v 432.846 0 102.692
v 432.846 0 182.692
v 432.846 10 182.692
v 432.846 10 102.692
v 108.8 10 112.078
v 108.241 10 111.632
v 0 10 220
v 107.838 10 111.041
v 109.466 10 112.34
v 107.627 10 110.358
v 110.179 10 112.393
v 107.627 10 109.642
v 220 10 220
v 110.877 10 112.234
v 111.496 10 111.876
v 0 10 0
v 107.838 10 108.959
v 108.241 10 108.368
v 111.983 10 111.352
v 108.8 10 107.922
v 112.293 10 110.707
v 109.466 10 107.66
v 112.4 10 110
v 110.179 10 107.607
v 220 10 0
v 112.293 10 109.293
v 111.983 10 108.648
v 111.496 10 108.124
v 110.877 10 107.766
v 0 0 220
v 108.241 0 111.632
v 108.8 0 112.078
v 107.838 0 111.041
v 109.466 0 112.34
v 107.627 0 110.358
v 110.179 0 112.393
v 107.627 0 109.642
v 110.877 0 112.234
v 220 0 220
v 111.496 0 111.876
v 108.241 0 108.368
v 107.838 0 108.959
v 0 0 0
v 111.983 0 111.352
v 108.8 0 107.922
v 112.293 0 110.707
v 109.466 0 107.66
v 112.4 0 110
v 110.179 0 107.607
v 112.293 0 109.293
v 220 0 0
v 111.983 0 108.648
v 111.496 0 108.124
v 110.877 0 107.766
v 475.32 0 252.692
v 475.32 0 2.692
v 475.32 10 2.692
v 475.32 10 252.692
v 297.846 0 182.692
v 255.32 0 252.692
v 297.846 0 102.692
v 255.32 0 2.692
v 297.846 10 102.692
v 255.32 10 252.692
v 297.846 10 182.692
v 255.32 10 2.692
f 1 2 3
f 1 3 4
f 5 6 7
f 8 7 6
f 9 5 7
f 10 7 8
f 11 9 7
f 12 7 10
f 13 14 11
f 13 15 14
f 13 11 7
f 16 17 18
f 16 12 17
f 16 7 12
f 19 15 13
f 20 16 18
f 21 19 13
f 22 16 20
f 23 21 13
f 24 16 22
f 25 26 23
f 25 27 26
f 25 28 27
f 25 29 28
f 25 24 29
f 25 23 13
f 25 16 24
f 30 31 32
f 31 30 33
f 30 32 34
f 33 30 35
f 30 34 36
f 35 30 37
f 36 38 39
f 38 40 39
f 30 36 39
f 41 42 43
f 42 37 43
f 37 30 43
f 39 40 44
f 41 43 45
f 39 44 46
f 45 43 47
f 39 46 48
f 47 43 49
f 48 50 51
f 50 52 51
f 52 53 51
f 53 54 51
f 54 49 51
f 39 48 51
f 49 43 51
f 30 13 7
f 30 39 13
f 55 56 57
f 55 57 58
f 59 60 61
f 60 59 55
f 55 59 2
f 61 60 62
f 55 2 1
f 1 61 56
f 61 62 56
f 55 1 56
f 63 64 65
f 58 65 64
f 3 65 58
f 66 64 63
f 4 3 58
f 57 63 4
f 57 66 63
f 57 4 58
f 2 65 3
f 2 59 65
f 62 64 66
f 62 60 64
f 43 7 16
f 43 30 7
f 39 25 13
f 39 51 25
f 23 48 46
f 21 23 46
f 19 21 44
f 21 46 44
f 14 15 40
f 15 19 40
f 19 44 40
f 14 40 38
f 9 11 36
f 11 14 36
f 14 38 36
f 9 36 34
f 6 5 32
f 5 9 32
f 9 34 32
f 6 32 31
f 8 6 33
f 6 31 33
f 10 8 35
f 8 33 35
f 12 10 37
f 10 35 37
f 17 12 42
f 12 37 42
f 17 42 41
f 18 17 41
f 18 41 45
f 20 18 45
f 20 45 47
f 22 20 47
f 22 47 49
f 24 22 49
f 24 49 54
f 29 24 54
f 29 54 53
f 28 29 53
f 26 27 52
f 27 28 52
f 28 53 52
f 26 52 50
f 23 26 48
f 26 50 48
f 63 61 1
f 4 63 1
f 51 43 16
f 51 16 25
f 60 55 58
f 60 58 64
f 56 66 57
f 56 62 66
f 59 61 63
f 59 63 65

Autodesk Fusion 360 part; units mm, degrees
sketch "Sketch1" plane through (0, 0, 0) normal (0, 1, 0) x (1, 0, 0)
  line L0 (0, 0) -> (220, 0)
  line L1 (220, 0) -> (220, -220)
  line L2 (220, -220) -> (0, -220)
  line L3 (0, -220) -> (0, 0)
  circle A0 centre (110, -110) radius 2.4
  line L4 (255.3203, -2.6922) -> (475.3203, -2.6922)
  line L5 (475.3203, -2.6922) -> (475.3203, -252.6922)
  line L6 (475.3203, -252.6922) -> (255.3203, -252.6922)
  line L7 (255.3203, -252.6922) -> (255.3203, -2.6922)
  line L8 (297.8463, -102.6922) -> (297.8463, -182.6922)
  line L9 (297.8463, -102.6922) -> (432.8463, -102.6922)
  line L10 (297.8463, -182.6922) -> (432.8463, -182.6922)
  line L11 (432.8463, -182.6922) -> (432.8463, -102.6922)
  dimension "d1" = 220
  dimension "d2" = 220
  dimension "d3" = 4.8
  dimension "d4" = 250
  dimension "d5" = 220
  dimension "d10" = 135
  dimension "d12" = 80
extrude "Extrude1" add sketch "Sketch1" along normal blind 10 contours L0 L1 L2 L3 makes body 1
extrude "Extrude2" add sketch "Sketch1" along normal blind 10 separate body contours L4 L5 L6 L7 makes body 2
